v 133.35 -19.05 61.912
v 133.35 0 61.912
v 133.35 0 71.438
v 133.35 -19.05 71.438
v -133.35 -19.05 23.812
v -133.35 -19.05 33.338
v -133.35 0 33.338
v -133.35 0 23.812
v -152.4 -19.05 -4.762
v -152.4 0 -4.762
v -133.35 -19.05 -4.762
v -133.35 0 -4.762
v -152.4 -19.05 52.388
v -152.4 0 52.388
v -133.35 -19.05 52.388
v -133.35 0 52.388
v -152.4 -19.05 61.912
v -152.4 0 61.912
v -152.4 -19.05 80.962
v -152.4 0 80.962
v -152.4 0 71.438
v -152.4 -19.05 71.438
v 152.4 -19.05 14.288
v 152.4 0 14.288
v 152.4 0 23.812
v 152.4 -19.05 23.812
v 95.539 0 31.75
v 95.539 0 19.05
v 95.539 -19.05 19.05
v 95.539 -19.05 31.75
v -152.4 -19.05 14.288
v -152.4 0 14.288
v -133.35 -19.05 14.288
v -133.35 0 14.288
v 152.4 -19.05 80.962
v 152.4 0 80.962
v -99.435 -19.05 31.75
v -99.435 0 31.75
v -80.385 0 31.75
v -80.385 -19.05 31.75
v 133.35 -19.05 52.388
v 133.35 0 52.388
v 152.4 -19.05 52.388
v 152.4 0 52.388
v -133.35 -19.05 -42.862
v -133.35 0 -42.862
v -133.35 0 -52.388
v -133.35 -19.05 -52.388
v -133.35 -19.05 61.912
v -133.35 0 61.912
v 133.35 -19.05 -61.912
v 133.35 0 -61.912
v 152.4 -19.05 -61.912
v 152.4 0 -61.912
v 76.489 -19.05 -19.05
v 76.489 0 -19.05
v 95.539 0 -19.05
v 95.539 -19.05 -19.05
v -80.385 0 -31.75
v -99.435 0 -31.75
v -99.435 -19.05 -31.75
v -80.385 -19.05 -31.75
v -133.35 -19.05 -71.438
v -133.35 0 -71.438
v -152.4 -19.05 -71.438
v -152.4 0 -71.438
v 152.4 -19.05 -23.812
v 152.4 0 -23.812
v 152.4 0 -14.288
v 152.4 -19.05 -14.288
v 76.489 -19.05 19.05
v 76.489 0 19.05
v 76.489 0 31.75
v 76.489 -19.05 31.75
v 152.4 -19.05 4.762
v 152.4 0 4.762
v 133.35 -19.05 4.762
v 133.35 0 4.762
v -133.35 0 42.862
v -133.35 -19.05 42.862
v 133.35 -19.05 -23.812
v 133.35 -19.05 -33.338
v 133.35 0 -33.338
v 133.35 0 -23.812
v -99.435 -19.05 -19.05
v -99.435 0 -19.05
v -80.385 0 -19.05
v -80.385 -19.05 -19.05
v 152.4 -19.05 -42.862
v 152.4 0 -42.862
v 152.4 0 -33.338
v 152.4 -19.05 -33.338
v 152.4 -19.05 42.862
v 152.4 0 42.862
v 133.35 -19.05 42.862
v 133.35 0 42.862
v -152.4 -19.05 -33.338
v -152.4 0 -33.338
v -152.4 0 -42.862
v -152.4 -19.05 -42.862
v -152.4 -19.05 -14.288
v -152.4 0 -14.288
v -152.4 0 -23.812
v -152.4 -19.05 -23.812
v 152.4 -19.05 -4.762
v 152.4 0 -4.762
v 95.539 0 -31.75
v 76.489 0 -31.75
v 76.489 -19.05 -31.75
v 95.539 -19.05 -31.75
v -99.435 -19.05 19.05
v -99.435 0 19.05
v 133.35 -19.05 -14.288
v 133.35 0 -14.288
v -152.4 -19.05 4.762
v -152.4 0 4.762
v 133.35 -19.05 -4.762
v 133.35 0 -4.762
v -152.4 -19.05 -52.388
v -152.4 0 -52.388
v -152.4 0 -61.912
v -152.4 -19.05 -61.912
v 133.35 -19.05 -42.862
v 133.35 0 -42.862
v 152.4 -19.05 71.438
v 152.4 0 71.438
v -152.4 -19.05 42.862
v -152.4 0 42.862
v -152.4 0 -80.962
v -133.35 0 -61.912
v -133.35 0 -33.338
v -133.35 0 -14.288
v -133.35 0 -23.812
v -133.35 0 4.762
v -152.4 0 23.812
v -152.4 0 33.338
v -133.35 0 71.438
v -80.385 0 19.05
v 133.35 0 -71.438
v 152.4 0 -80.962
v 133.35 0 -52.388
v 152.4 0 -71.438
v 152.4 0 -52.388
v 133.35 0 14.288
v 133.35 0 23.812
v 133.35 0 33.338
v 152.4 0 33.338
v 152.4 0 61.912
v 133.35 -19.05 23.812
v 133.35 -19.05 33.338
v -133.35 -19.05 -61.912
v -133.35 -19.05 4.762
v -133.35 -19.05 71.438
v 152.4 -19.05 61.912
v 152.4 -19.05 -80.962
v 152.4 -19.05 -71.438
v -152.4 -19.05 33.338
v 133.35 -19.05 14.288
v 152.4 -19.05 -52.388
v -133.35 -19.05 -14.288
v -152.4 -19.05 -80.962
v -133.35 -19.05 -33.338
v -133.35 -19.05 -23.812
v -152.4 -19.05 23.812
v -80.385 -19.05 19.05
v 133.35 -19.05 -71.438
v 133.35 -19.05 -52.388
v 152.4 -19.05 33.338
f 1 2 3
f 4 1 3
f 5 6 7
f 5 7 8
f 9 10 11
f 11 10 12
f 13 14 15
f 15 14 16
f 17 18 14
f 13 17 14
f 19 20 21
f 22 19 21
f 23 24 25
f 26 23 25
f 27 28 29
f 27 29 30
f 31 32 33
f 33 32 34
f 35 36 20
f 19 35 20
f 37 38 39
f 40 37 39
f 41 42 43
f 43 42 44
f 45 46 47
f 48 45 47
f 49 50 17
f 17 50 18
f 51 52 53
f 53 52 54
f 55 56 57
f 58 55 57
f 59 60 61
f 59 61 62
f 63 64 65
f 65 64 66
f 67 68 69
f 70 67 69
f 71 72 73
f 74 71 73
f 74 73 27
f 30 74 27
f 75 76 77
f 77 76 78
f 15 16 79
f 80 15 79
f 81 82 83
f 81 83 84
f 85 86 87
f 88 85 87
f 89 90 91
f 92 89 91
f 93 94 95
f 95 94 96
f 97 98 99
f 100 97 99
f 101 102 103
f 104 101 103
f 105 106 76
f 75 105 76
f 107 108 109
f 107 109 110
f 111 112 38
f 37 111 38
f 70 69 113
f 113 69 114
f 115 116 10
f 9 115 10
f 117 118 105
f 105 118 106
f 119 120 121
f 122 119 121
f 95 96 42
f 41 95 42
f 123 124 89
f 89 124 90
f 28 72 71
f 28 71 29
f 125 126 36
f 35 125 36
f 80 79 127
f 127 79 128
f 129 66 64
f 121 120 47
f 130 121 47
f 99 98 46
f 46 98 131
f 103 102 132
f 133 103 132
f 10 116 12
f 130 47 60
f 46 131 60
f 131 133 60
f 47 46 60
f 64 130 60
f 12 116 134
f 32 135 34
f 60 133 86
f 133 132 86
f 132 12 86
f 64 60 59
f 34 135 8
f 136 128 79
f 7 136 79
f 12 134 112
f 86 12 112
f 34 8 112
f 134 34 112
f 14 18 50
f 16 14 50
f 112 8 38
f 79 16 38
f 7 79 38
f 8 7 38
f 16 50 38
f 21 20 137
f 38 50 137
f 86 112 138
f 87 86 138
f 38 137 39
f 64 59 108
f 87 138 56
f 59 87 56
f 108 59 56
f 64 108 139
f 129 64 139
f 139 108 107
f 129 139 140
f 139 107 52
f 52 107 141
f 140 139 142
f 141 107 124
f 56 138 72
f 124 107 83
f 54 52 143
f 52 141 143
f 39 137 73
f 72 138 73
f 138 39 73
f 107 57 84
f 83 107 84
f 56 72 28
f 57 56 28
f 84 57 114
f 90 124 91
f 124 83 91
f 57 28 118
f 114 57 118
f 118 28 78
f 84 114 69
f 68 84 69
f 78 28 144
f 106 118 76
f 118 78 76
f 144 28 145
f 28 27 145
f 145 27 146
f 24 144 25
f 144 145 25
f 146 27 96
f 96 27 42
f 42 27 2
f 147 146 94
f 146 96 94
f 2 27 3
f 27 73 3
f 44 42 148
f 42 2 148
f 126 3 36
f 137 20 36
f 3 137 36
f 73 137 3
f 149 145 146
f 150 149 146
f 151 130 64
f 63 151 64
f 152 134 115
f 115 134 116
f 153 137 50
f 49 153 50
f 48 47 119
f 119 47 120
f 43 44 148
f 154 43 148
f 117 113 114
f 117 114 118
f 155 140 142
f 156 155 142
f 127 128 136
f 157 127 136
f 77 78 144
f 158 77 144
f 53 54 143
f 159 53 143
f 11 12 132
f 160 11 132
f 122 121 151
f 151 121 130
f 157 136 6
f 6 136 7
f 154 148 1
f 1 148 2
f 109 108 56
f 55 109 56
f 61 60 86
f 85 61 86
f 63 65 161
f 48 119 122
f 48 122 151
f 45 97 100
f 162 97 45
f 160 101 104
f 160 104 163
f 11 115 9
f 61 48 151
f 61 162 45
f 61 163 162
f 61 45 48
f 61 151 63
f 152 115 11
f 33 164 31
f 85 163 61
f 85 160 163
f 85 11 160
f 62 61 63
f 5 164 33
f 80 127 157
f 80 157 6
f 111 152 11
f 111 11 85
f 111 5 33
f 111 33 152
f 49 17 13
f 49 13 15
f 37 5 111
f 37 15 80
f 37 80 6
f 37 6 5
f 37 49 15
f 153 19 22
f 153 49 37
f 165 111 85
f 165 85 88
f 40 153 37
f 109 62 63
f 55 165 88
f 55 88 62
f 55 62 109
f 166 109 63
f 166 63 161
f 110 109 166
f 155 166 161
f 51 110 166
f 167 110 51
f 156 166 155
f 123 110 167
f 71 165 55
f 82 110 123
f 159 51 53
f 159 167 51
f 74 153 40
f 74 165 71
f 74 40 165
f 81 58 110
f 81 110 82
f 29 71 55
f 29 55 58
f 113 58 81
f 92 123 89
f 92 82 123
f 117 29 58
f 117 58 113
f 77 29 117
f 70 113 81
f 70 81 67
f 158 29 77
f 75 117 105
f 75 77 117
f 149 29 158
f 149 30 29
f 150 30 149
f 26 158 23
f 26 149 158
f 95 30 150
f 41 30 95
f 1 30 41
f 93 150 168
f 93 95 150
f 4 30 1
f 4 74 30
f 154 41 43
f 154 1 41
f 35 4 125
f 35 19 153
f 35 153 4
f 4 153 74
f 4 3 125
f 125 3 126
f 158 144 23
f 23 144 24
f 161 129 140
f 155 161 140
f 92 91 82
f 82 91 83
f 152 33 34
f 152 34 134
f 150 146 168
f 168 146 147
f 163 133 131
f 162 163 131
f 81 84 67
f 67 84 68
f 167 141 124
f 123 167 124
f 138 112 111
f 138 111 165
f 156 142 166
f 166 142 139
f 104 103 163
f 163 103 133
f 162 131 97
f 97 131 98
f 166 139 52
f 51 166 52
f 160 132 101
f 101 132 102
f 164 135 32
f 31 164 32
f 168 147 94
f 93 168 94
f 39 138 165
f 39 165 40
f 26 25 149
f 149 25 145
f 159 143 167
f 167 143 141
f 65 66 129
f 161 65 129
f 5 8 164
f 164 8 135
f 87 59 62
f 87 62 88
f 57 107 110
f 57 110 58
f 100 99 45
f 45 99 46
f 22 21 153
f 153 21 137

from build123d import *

# Parameters (mm, degrees)
F0_W     = 19.05
F0_H     = 12.7
F1_DEPTH = 19.05


with BuildPart() as f1:
    # F0 (on Front) → F1 (new body)
    with BuildSketch(Plane.XZ):
        Polygon((-152.4, -80.9625), (0, -80.9625), (152.4, -80.9625), (152.4, -71.4375), (133.35, -71.4375), (133.35, -61.9125), (152.4, -61.9125), (152.4, -52.3875), (133.35, -52.3875), (133.35, -42.8625), (152.4, -42.8625), (152.4, -33.3375), (133.35, -33.3375), (133.35, -23.8125), (152.4, -23.8125), (152.4, -14.2875), (133.35, -14.2875), (133.35, -4.7625), (152.4, -4.7625), (152.4, 4.7625), (133.35, 4.7625), (133.35, 14.2875), (152.4, 14.2875), (152.4, 23.8125), (133.35, 23.8125), (133.35, 33.3375), (152.4, 33.3375), (152.4, 42.8625), (133.35, 42.8625), (133.35, 52.3875), (152.4, 52.3875), (152.4, 61.9125), (133.35, 61.9125), (133.35, 71.4375), (152.4, 71.4375), (152.4, 80.9625), (-152.4, 80.9625), (-152.4, 71.4375), (-133.35, 71.4375), (-133.35, 61.9125), (-152.4, 61.9125), (-152.4, 52.3875), (-133.35, 52.3875), (-133.35, 42.8625), (-152.4, 42.8625), (-152.4, 33.3375), (-133.35, 33.3375), (-133.35, 23.8125), (-152.4, 23.8125), (-152.4, 14.2875), (-133.35, 14.2875), (-133.35, 4.7625), (-152.4, 4.7625), (-152.4, -4.7625), (-133.35, -4.7625), (-133.35, -14.2875), (-152.4, -14.2875), (-152.4, -23.8125), (-133.35, -23.8125), (-133.35, -33.3375), (-152.4, -33.3375), (-152.4, -42.8625), (-133.35, -42.8625), (-133.35, -52.3875), (-152.4, -52.3875), (-152.4, -61.9125), (-133.35, -61.9125), (-133.35, -71.4375), (-152.4, -71.4375), align=None)
        with Locations((-89.910227, -25.4)):
            Rectangle(F0_W, F0_H, mode=Mode.SUBTRACT)
        with Locations((86.013636, -25.4)):
            Rectangle(F0_W, F0_H, mode=Mode.SUBTRACT)
        with Locations((-89.910227, 25.4)):
            Rectangle(F0_W, F0_H, mode=Mode.SUBTRACT)
        with Locations((86.013636, 25.4)):
            Rectangle(F0_W, F0_H, mode=Mode.SUBTRACT)
    extrude(amount=F1_DEPTH)


solid = f1.part
